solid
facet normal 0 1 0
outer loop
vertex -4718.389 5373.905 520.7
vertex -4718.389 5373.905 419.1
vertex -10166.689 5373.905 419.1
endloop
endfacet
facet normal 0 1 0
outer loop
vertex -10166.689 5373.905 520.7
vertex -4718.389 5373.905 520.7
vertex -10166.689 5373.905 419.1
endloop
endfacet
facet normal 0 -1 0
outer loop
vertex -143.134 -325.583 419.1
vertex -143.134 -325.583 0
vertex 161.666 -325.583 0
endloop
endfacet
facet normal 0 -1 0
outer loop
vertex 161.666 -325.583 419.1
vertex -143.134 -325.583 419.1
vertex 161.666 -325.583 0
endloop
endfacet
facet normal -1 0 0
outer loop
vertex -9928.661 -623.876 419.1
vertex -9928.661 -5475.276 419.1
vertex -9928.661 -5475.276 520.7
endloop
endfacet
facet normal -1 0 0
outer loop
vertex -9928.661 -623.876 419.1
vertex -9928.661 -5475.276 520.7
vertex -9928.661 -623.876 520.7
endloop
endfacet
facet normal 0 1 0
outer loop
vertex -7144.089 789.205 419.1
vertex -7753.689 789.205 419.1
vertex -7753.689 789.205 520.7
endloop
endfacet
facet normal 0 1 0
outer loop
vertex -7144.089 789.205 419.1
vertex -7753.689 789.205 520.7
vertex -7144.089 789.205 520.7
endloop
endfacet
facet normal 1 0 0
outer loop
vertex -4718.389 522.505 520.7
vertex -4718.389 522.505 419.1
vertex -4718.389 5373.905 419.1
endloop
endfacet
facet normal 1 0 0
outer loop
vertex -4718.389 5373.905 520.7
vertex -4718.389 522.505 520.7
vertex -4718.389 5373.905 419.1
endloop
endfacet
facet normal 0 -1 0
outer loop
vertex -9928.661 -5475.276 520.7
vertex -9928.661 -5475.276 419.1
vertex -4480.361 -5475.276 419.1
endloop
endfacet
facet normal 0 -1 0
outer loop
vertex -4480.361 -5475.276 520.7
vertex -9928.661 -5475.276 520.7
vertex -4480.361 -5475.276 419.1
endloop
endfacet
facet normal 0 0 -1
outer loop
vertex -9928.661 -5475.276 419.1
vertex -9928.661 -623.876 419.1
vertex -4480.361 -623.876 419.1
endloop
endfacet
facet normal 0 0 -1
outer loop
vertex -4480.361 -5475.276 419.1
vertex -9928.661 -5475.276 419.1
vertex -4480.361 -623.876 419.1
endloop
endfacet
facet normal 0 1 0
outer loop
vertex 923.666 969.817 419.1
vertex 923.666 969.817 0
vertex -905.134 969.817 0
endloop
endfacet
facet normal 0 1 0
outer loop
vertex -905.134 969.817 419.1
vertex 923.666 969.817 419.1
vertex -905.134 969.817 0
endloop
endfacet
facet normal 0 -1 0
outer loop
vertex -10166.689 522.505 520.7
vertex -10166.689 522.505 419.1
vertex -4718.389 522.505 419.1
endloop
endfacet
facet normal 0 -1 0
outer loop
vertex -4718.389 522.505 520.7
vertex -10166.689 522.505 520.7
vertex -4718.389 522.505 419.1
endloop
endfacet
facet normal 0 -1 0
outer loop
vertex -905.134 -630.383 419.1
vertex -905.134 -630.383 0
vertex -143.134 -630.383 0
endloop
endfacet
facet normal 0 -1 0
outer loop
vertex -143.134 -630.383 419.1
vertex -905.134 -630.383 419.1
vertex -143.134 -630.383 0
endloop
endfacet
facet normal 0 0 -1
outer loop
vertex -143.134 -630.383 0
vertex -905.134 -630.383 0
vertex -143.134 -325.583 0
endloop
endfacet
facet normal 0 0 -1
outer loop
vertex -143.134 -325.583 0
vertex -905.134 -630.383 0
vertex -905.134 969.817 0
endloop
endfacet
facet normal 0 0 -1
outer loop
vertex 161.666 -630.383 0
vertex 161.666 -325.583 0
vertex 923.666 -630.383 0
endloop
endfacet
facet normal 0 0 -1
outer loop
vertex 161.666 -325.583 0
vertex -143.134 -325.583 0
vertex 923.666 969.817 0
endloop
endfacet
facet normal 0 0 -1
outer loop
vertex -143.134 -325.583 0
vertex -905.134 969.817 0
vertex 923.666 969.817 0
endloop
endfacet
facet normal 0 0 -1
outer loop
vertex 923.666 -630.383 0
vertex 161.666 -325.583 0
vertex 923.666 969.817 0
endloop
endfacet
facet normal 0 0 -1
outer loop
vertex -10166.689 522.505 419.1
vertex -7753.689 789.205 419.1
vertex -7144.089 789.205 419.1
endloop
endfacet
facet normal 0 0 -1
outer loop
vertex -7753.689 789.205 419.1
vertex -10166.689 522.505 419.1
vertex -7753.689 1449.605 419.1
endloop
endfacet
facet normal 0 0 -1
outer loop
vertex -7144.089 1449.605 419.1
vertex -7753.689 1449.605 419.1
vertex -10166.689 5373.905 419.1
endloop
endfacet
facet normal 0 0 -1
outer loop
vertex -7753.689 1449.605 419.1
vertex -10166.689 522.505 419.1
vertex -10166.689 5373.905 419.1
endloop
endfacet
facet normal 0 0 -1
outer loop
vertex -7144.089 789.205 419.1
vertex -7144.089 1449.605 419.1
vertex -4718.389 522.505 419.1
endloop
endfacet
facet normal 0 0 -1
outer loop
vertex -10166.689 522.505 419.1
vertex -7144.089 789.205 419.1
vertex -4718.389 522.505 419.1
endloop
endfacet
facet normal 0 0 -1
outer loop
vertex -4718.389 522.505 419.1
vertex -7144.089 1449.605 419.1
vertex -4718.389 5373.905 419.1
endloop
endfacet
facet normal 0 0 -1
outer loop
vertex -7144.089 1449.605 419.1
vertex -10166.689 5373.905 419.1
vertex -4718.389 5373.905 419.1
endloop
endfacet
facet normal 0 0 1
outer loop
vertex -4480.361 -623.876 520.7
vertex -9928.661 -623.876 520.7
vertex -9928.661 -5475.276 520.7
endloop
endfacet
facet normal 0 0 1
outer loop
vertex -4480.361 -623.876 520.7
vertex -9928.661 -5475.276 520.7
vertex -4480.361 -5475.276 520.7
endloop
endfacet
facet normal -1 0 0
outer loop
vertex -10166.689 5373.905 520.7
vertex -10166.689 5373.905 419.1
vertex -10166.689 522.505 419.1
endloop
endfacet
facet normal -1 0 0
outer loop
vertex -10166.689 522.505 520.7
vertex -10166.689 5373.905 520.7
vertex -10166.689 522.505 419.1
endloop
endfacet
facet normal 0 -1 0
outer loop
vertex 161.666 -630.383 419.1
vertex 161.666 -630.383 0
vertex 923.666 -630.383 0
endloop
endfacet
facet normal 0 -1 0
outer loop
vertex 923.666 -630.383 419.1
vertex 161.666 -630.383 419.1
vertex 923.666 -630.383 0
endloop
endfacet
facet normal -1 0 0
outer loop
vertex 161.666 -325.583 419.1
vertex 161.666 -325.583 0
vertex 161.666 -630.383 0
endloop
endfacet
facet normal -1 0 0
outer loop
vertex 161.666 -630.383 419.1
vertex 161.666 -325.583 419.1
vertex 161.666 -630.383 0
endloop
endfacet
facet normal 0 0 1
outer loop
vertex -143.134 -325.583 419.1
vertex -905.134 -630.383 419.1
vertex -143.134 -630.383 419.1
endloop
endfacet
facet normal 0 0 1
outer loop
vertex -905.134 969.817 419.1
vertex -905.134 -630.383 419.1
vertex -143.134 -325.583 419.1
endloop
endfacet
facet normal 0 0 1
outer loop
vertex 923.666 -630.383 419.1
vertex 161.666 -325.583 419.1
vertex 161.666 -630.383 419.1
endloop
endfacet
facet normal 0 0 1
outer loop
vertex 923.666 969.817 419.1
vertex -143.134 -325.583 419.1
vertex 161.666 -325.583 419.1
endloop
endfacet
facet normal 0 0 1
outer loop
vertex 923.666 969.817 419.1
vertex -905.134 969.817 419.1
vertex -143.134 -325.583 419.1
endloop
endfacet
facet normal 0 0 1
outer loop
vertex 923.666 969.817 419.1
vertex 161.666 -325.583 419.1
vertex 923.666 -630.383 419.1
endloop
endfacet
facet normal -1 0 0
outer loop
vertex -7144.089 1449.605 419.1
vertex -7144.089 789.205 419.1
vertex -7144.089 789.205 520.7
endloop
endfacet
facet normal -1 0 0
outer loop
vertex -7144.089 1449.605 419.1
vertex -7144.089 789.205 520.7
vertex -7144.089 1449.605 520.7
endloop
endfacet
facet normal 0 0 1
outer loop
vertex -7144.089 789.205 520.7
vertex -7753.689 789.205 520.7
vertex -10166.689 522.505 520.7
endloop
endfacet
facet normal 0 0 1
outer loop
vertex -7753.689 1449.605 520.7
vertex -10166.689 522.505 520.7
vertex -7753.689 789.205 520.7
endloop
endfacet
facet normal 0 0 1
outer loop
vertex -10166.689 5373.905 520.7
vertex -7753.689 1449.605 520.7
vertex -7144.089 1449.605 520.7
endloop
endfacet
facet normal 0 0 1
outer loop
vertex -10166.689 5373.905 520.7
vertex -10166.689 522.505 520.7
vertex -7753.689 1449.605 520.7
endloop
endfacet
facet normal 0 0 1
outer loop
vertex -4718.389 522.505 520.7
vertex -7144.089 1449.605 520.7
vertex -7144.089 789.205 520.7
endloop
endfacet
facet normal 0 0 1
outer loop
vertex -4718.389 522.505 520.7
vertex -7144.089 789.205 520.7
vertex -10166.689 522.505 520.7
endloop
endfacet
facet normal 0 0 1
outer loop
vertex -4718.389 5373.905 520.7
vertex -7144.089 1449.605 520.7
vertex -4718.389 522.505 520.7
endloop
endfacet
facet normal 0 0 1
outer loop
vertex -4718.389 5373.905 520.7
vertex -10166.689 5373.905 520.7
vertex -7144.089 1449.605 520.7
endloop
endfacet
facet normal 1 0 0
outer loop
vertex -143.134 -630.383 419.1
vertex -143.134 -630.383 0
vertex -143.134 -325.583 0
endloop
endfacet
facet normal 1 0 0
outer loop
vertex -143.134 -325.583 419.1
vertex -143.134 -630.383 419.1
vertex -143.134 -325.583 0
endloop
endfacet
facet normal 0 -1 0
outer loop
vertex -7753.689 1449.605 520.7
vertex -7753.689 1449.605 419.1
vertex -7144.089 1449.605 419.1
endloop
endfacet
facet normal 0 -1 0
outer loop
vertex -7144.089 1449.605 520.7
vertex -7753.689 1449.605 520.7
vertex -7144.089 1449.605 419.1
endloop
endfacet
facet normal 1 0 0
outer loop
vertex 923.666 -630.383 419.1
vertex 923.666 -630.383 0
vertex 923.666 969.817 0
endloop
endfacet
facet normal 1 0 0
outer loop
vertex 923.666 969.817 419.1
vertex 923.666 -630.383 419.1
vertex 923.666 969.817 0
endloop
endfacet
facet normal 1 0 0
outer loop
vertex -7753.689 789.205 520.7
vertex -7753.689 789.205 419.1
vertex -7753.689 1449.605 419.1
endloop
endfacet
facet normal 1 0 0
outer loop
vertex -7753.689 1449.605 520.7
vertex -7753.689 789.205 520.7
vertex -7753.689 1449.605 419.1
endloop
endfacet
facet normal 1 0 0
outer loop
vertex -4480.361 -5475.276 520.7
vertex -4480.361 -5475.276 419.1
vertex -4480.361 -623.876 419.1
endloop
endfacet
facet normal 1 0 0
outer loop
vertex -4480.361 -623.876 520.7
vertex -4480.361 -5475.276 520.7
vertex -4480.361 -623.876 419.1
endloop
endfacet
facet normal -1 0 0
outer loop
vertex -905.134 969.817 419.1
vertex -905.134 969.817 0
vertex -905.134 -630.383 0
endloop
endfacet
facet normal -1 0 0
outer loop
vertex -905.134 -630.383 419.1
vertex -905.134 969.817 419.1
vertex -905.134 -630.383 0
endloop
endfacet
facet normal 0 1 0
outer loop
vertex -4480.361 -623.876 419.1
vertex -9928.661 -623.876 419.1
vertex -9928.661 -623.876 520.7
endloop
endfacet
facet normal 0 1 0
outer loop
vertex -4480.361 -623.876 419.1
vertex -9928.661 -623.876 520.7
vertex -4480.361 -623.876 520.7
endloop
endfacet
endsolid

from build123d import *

# Parameters (mm, degrees)
F1_DEPTH = 419.1
F2_W     = 609.6
F2_H     = 660.4
F3_DEPTH = 101.6
F4_W     = 5448.3
F4_H     = 4851.4
F5_DEPTH = 101.6


with BuildPart() as f1:
    # F0 (on Top) → F1 (new body)
    with BuildSketch(Plane.XY):
        Polygon((923.666438, 969.817395), (-905.133562, 969.817395), (-905.133562, -630.382605), (-143.133562, -630.382605), (-143.133562, -325.582605), (161.666438, -325.582605), (161.666438, -630.382605), (923.666438, -630.382605), align=None)
    extrude(amount=F1_DEPTH)


with BuildPart() as f3:
    # F2 (on face) → F3 (new body)
    with BuildSketch(Plane.XY.offset(419.1)):
        Polygon((-7144.088812, 522.504811), (-4718.388812, 522.504811), (-4718.388812, 5373.904811), (-10166.688812, 5373.904811), (-10166.688812, 522.504811), (-7753.688812, 522.504811), align=None)
        with Locations((-7448.888812, 1119.404811)):
            Rectangle(F2_W, F2_H, mode=Mode.SUBTRACT)
    extrude(amount=F3_DEPTH)


with BuildPart() as f5:
    # F4 (on face) → F5 (new body)
    with BuildSketch(Plane.XY.offset(419.1)):
        with Locations((-7204.511404, -3049.575722)):
            Rectangle(F4_W, F4_H)
    extrude(amount=F5_DEPTH)


solid = Compound([f1.part, f3.part, f5.part])
